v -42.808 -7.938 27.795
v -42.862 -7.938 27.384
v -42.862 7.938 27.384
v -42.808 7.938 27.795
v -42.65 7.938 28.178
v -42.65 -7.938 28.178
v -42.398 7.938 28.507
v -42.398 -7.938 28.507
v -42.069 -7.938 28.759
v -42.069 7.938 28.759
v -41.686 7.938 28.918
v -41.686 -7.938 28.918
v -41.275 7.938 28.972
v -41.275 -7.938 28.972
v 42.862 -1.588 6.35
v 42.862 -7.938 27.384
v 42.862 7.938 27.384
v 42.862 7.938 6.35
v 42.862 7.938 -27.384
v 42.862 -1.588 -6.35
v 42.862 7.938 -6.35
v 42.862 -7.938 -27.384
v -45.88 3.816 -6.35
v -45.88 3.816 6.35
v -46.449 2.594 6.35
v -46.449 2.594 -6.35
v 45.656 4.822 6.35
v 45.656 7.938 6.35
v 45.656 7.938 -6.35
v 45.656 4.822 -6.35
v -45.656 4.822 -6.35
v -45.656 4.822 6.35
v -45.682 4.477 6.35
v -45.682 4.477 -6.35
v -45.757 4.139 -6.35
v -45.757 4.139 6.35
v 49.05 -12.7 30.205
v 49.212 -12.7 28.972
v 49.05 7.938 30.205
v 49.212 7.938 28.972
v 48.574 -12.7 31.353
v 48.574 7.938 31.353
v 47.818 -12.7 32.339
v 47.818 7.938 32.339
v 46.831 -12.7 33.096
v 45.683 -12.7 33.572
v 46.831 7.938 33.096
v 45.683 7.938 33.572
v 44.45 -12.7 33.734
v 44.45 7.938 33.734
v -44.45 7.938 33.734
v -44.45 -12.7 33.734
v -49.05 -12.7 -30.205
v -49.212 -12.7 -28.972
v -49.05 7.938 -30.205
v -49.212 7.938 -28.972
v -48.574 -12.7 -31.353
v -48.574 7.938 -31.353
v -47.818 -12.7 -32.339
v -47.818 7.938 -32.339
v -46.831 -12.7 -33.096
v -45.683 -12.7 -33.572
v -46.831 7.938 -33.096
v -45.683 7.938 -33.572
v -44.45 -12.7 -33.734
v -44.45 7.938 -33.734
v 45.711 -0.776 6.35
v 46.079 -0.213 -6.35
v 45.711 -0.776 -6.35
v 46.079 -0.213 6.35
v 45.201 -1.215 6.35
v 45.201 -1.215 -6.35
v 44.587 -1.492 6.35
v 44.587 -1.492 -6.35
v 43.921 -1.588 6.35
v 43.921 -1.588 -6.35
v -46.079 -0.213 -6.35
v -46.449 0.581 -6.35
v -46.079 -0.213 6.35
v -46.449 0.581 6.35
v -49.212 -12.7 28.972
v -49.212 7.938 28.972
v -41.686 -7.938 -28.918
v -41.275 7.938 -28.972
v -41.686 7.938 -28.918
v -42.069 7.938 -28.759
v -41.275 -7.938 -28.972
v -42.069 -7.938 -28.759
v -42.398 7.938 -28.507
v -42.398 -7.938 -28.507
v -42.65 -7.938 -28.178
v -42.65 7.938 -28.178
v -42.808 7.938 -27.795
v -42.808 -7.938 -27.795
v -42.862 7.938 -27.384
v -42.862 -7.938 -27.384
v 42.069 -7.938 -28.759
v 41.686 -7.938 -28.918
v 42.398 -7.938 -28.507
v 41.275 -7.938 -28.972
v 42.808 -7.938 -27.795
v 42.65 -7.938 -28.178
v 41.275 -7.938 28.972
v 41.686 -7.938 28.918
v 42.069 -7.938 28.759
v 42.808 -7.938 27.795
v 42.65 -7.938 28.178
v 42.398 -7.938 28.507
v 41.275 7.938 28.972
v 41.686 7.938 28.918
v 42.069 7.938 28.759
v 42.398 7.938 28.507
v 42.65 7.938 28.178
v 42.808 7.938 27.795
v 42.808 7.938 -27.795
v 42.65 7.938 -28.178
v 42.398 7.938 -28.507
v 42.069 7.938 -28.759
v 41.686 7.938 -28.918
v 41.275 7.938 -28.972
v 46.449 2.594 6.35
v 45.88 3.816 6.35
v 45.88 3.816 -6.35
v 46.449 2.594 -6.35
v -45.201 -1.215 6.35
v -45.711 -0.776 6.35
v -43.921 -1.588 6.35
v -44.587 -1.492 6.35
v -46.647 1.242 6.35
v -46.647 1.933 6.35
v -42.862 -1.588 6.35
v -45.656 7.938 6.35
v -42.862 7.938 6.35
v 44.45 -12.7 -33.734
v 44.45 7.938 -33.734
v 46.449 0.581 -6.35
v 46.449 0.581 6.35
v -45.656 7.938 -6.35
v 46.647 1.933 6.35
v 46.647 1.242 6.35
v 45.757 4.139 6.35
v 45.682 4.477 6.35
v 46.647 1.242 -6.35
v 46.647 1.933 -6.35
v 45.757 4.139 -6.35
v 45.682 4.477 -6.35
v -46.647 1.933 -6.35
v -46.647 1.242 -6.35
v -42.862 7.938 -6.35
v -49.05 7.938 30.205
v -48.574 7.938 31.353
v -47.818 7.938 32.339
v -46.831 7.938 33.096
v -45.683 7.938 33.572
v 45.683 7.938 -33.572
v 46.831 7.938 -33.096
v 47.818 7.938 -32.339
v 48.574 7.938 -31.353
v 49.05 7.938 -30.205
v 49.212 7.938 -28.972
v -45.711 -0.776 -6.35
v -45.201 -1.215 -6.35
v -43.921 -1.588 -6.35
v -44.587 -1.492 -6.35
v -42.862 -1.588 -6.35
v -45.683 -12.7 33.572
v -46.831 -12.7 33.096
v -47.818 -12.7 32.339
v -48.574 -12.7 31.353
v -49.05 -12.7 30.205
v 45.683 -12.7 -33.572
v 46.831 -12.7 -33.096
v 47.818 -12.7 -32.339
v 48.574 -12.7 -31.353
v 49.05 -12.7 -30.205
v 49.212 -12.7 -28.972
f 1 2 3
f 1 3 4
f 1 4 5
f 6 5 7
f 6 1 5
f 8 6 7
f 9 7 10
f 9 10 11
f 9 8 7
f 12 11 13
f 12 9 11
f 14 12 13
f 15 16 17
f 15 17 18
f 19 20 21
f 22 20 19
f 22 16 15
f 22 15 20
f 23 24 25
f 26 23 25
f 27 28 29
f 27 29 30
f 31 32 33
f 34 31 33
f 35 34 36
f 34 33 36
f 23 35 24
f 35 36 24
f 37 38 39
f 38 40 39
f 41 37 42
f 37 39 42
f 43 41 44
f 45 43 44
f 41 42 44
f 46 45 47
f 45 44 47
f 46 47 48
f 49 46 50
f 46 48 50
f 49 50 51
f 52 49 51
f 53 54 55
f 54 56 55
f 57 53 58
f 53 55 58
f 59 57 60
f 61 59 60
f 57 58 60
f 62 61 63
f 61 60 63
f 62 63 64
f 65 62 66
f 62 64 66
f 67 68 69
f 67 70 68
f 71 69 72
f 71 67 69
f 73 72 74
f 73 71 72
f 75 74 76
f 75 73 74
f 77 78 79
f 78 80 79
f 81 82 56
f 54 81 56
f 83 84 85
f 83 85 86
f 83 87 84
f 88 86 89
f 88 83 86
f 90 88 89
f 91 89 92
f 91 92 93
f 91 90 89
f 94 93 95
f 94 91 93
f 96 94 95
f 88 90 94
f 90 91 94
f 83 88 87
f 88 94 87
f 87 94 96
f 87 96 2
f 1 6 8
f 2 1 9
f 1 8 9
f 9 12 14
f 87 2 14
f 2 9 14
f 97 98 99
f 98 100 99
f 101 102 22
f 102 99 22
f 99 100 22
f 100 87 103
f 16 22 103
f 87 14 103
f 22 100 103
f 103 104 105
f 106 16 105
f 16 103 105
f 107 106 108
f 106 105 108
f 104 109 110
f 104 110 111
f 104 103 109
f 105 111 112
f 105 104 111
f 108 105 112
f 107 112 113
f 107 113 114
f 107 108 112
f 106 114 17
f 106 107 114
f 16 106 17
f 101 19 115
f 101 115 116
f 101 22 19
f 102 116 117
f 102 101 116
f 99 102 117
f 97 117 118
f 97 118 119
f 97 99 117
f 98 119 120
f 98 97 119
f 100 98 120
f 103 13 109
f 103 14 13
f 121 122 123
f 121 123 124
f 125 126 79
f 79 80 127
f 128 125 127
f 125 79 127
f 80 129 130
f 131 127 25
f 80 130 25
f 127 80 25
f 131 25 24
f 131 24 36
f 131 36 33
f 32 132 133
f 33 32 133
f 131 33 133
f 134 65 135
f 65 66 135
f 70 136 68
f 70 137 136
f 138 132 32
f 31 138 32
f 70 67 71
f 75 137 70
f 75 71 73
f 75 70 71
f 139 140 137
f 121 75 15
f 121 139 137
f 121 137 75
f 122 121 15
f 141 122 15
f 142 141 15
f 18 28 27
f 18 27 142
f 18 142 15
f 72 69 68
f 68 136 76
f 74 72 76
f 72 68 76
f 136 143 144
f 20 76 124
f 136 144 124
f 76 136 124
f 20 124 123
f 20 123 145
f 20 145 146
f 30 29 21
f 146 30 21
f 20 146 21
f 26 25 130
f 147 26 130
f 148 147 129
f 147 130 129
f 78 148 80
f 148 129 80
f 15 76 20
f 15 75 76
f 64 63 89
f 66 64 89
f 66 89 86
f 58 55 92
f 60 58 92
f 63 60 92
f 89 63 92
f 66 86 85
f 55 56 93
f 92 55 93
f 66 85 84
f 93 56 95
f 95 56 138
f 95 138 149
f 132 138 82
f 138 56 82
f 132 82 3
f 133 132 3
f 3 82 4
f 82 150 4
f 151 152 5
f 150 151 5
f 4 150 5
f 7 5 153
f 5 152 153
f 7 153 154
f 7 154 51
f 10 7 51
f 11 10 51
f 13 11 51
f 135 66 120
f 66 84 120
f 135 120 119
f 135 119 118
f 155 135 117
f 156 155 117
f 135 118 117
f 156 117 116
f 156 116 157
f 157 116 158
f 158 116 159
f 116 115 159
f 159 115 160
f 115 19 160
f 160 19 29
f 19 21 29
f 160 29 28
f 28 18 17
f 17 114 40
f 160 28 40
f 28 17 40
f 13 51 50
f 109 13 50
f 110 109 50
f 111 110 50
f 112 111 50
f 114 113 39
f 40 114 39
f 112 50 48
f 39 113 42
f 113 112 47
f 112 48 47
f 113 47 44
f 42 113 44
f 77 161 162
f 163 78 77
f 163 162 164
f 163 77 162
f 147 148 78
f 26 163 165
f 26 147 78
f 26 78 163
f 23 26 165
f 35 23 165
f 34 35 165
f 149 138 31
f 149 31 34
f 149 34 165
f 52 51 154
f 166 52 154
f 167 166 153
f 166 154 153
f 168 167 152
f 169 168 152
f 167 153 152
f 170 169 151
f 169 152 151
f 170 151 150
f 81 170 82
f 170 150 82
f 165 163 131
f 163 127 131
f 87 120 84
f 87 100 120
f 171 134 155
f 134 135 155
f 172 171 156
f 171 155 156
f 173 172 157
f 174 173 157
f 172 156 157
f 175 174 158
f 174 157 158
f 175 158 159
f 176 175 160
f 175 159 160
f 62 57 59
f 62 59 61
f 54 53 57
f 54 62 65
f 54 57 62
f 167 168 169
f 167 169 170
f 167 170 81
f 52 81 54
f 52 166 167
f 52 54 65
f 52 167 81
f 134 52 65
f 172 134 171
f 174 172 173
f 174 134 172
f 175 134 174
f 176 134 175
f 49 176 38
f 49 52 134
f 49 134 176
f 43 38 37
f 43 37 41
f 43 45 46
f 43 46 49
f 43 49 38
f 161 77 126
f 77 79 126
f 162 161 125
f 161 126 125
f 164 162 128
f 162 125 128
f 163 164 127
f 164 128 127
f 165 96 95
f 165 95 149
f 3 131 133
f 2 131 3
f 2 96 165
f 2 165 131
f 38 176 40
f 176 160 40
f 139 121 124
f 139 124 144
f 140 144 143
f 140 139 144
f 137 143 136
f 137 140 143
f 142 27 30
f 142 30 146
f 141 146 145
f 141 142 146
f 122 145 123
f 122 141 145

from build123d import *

# Parameters (mm, degrees)
F1_DEPTH = 7.9375
F3_DEPTH = 4.7625
F5_DEPTH = 6.35


# Not quite as in the source:
# - a pattern or mirror of a feature is missing from the dataset's text; its kind, count and spacing are read off the source's solid


with BuildPart() as f1:
    # F0 (on Front) → F1 (new body, symmetric)
    with BuildSketch(Plane.XZ):
        with BuildLine():
            Line((44.45, 33.734375), (-44.45, 33.734375))
            ThreePointArc((-44.45, 33.734375), (-47.8175960454, 32.3394710454), (-49.2125, 28.971875))
            Line((-49.2125, 28.971875), (-49.2125, -28.971875))
            ThreePointArc((-49.2125, -28.971875), (-47.8175960454, -32.3394710454), (-44.45, -33.734375))
            Line((-44.45, -33.734375), (44.45, -33.734375))
            ThreePointArc((44.45, -33.734375), (47.8175960454, -32.3394710454), (49.2125, -28.971875))
            Line((49.2125, -28.971875), (49.2125, 28.971875))
            ThreePointArc((49.2125, 28.971875), (47.8175960454, 32.3394710454), (44.45, 33.734375))
        make_face()
        with BuildLine():
            ThreePointArc((-42.8625, 27.384375), (-42.3975320151, 28.5069070151), (-41.275, 28.971875))
            Line((-41.275, 28.971875), (41.275, 28.971875))
            ThreePointArc((41.275, 28.971875), (42.3975320151, 28.5069070151), (42.8625, 27.384375))
            Line((42.8625, 27.384375), (42.8625, -27.384375))
            ThreePointArc((42.8625, -27.384375), (42.3975320151, -28.5069070151), (41.275, -28.971875))
            Line((41.275, -28.971875), (-41.275, -28.971875))
            ThreePointArc((-41.275, -28.971875), (-42.3975320151, -28.5069070151), (-42.8625, -27.384375))
            Line((-42.8625, -27.384375), (-42.8625, 27.384375))
        make_face(mode=Mode.SUBTRACT)
    extrude(amount=F1_DEPTH, both=True)

    # F2 (on face) → F3 (join)
    with BuildSketch(Plane.XZ.offset(7.9375)):
        with BuildLine():
            Line((-49.2125, 28.971875), (-49.2125, -28.971875))
            ThreePointArc((-49.2125, -28.971875), (-47.8175960454, -32.3394710454), (-44.45, -33.734375))
            Line((-44.45, -33.734375), (44.45, -33.734375))
            ThreePointArc((44.45, -33.734375), (47.8175960454, -32.3394710454), (49.2125, -28.971875))
            Line((49.2125, -28.971875), (49.2125, 28.971875))
            ThreePointArc((49.2125, 28.971875), (47.8175960454, 32.3394710454), (44.45, 33.734375))
            Line((44.45, 33.734375), (-44.45, 33.734375))
            ThreePointArc((-44.45, 33.734375), (-47.8175960454, 32.3394710454), (-49.2125, 28.971875))
        make_face()
        with BuildLine():
            Line((41.275, -28.971875), (-41.275, -28.971875))
            ThreePointArc((-41.275, -28.971875), (-42.3975320151, -28.5069070151), (-42.8625, -27.384375))
            Line((-42.8625, -27.384375), (-42.8625, 27.384375))
            ThreePointArc((-42.8625, 27.384375), (-42.3975320151, 28.5069070151), (-41.275, 28.971875))
            Line((-41.275, 28.971875), (41.275, 28.971875))
            ThreePointArc((41.275, 28.971875), (42.3975320151, 28.5069070151), (42.8625, 27.384375))
            Line((42.8625, 27.384375), (42.8625, -27.384375))
            ThreePointArc((42.8625, -27.384375), (42.3975320151, -28.5069070151), (41.275, -28.971875))
        make_face(mode=Mode.SUBTRACT)
        with BuildLine():
            ThreePointArc((-42.8625, -27.384375), (-42.3975320151, -28.5069070151), (-41.275, -28.971875))
            Line((-41.275, -28.971875), (41.275, -28.971875))
            ThreePointArc((41.275, -28.971875), (42.3975320151, -28.5069070151), (42.8625, -27.384375))
            Line((42.8625, -27.384375), (42.8625, 27.384375))
            ThreePointArc((42.8625, 27.384375), (42.3975320151, 28.5069070151), (41.275, 28.971875))
            Line((41.275, 28.971875), (-41.275, 28.971875))
            ThreePointArc((-41.275, 28.971875), (-42.3975320151, 28.5069070151), (-42.8625, 27.384375))
            Line((-42.8625, 27.384375), (-42.8625, -27.384375))
        make_face()
    extrude(amount=F3_DEPTH)

    # F4 (on Top) → F5 (cut, symmetric)
    with BuildSketch(Plane.XY):
        with BuildLine():
            Line((-43.9211182963, -1.5875), (-42.8625, -1.5875))
            Line((-42.8625, -1.5875), (-42.8625, 1.5875))
            Line((-42.8625, 1.5875), (-42.8625, 7.9375))
            Line((-42.8625, 7.9375), (-45.6565, 7.9375))
            Line((-45.6565, 7.9375), (-45.6565, 4.8221398621))
            ThreePointArc((-45.6565, 4.8221398621), (-45.712945133, 4.3067430314), (-45.8796045821, 3.8157801263))
            Line((-45.8796045821, 3.8157801263), (-46.4493954179, 2.5938597358))
            ThreePointArc((-46.4493954179, 2.5938597358), (-46.6725, 1.5875), (-46.4493954179, 0.5811402642))
            Line((-46.4493954179, 0.5811402642), (-46.0792637142, -0.2126097358))
            ThreePointArc((-46.0792637142, -0.2126097358), (-45.2005629887, -1.2145758803), (-43.9211182963, -1.5875))
        make_face()
    f5 = extrude(amount=F5_DEPTH, both=True, mode=Mode.SUBTRACT)

    # F5_copies: F5 across plane
    add(f5.mirror(Plane(origin=(0, 0, 0), x_dir=(0, 0, 1), z_dir=(1, 0, 0))), mode=Mode.SUBTRACT)


solid = f1.part
